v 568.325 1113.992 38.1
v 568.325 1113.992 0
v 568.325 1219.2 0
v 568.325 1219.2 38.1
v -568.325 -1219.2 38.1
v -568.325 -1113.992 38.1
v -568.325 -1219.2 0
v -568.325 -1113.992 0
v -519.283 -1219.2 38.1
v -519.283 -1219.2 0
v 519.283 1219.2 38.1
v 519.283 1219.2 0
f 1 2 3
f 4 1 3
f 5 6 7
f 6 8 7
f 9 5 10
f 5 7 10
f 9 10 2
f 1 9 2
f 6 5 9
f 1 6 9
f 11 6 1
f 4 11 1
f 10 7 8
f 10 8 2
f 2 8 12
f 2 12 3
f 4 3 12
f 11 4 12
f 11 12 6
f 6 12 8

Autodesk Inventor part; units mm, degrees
ref_plane "YZ Plane" through (0, 0, 0) normal (1, 0, 0) x (0, 1, 0)
ref_plane "XZ Plane" through (0, 0, 0) normal (0, 1, 0) x (-1, 0, 0)
ref_plane "XY Plane" through (0, 0, 0) normal (0, 0, 1) x (1, 0, 0)
sketch "Sketch1" plane through (0, 0, 0) normal (0, 0, 1) x (1, 0, 0)
  line L0 (-568.325, -1219.2) -> (568.325, -1219.2)
  line L1 (568.325, -1219.2) -> (568.325, 1219.2)
  line L2 (568.325, 1219.2) -> (-568.325, 1219.2)
  line L3 (-568.325, 1219.2) -> (-568.325, -1219.2)
  line L4 (-568.325, -1219.2) -> (568.325, 1219.2) construction
  line L5 (568.325, -1219.2) -> (-568.325, 1219.2) construction
  line L6 (568.325, 1219.2) -> (-568.325, -1219.2)
  line L7 (-528.0371, -1237.98) -> (-608.6129, -1200.42)
  line L8 (608.6129, 1200.42) -> (528.0371, 1237.98)
  line L9 (528.0371, 1237.98) -> (-608.6129, -1200.42)
  line L10 (-528.0371, -1237.98) -> (608.6129, 1200.42)
  point P0 (0, 0)
  point P1 (519.2829, 1219.2)
  point P2 (-568.325, -1113.9923)
  point P3 (-519.2829, -1219.2)
  point P4 (568.325, 1113.9923)
  dimension "d0" = 1136.65
  dimension "d1" = 2438.4
  dimension "d2" = 88.9
  dimension "d3" = 88.9
extrude "Extrusion1" add sketch "Sketch1" along normal blind 38.1 contours L6 L1 L10 L0 | L3 L9 L2 L6
properties part number "S_2x4x105.918"
